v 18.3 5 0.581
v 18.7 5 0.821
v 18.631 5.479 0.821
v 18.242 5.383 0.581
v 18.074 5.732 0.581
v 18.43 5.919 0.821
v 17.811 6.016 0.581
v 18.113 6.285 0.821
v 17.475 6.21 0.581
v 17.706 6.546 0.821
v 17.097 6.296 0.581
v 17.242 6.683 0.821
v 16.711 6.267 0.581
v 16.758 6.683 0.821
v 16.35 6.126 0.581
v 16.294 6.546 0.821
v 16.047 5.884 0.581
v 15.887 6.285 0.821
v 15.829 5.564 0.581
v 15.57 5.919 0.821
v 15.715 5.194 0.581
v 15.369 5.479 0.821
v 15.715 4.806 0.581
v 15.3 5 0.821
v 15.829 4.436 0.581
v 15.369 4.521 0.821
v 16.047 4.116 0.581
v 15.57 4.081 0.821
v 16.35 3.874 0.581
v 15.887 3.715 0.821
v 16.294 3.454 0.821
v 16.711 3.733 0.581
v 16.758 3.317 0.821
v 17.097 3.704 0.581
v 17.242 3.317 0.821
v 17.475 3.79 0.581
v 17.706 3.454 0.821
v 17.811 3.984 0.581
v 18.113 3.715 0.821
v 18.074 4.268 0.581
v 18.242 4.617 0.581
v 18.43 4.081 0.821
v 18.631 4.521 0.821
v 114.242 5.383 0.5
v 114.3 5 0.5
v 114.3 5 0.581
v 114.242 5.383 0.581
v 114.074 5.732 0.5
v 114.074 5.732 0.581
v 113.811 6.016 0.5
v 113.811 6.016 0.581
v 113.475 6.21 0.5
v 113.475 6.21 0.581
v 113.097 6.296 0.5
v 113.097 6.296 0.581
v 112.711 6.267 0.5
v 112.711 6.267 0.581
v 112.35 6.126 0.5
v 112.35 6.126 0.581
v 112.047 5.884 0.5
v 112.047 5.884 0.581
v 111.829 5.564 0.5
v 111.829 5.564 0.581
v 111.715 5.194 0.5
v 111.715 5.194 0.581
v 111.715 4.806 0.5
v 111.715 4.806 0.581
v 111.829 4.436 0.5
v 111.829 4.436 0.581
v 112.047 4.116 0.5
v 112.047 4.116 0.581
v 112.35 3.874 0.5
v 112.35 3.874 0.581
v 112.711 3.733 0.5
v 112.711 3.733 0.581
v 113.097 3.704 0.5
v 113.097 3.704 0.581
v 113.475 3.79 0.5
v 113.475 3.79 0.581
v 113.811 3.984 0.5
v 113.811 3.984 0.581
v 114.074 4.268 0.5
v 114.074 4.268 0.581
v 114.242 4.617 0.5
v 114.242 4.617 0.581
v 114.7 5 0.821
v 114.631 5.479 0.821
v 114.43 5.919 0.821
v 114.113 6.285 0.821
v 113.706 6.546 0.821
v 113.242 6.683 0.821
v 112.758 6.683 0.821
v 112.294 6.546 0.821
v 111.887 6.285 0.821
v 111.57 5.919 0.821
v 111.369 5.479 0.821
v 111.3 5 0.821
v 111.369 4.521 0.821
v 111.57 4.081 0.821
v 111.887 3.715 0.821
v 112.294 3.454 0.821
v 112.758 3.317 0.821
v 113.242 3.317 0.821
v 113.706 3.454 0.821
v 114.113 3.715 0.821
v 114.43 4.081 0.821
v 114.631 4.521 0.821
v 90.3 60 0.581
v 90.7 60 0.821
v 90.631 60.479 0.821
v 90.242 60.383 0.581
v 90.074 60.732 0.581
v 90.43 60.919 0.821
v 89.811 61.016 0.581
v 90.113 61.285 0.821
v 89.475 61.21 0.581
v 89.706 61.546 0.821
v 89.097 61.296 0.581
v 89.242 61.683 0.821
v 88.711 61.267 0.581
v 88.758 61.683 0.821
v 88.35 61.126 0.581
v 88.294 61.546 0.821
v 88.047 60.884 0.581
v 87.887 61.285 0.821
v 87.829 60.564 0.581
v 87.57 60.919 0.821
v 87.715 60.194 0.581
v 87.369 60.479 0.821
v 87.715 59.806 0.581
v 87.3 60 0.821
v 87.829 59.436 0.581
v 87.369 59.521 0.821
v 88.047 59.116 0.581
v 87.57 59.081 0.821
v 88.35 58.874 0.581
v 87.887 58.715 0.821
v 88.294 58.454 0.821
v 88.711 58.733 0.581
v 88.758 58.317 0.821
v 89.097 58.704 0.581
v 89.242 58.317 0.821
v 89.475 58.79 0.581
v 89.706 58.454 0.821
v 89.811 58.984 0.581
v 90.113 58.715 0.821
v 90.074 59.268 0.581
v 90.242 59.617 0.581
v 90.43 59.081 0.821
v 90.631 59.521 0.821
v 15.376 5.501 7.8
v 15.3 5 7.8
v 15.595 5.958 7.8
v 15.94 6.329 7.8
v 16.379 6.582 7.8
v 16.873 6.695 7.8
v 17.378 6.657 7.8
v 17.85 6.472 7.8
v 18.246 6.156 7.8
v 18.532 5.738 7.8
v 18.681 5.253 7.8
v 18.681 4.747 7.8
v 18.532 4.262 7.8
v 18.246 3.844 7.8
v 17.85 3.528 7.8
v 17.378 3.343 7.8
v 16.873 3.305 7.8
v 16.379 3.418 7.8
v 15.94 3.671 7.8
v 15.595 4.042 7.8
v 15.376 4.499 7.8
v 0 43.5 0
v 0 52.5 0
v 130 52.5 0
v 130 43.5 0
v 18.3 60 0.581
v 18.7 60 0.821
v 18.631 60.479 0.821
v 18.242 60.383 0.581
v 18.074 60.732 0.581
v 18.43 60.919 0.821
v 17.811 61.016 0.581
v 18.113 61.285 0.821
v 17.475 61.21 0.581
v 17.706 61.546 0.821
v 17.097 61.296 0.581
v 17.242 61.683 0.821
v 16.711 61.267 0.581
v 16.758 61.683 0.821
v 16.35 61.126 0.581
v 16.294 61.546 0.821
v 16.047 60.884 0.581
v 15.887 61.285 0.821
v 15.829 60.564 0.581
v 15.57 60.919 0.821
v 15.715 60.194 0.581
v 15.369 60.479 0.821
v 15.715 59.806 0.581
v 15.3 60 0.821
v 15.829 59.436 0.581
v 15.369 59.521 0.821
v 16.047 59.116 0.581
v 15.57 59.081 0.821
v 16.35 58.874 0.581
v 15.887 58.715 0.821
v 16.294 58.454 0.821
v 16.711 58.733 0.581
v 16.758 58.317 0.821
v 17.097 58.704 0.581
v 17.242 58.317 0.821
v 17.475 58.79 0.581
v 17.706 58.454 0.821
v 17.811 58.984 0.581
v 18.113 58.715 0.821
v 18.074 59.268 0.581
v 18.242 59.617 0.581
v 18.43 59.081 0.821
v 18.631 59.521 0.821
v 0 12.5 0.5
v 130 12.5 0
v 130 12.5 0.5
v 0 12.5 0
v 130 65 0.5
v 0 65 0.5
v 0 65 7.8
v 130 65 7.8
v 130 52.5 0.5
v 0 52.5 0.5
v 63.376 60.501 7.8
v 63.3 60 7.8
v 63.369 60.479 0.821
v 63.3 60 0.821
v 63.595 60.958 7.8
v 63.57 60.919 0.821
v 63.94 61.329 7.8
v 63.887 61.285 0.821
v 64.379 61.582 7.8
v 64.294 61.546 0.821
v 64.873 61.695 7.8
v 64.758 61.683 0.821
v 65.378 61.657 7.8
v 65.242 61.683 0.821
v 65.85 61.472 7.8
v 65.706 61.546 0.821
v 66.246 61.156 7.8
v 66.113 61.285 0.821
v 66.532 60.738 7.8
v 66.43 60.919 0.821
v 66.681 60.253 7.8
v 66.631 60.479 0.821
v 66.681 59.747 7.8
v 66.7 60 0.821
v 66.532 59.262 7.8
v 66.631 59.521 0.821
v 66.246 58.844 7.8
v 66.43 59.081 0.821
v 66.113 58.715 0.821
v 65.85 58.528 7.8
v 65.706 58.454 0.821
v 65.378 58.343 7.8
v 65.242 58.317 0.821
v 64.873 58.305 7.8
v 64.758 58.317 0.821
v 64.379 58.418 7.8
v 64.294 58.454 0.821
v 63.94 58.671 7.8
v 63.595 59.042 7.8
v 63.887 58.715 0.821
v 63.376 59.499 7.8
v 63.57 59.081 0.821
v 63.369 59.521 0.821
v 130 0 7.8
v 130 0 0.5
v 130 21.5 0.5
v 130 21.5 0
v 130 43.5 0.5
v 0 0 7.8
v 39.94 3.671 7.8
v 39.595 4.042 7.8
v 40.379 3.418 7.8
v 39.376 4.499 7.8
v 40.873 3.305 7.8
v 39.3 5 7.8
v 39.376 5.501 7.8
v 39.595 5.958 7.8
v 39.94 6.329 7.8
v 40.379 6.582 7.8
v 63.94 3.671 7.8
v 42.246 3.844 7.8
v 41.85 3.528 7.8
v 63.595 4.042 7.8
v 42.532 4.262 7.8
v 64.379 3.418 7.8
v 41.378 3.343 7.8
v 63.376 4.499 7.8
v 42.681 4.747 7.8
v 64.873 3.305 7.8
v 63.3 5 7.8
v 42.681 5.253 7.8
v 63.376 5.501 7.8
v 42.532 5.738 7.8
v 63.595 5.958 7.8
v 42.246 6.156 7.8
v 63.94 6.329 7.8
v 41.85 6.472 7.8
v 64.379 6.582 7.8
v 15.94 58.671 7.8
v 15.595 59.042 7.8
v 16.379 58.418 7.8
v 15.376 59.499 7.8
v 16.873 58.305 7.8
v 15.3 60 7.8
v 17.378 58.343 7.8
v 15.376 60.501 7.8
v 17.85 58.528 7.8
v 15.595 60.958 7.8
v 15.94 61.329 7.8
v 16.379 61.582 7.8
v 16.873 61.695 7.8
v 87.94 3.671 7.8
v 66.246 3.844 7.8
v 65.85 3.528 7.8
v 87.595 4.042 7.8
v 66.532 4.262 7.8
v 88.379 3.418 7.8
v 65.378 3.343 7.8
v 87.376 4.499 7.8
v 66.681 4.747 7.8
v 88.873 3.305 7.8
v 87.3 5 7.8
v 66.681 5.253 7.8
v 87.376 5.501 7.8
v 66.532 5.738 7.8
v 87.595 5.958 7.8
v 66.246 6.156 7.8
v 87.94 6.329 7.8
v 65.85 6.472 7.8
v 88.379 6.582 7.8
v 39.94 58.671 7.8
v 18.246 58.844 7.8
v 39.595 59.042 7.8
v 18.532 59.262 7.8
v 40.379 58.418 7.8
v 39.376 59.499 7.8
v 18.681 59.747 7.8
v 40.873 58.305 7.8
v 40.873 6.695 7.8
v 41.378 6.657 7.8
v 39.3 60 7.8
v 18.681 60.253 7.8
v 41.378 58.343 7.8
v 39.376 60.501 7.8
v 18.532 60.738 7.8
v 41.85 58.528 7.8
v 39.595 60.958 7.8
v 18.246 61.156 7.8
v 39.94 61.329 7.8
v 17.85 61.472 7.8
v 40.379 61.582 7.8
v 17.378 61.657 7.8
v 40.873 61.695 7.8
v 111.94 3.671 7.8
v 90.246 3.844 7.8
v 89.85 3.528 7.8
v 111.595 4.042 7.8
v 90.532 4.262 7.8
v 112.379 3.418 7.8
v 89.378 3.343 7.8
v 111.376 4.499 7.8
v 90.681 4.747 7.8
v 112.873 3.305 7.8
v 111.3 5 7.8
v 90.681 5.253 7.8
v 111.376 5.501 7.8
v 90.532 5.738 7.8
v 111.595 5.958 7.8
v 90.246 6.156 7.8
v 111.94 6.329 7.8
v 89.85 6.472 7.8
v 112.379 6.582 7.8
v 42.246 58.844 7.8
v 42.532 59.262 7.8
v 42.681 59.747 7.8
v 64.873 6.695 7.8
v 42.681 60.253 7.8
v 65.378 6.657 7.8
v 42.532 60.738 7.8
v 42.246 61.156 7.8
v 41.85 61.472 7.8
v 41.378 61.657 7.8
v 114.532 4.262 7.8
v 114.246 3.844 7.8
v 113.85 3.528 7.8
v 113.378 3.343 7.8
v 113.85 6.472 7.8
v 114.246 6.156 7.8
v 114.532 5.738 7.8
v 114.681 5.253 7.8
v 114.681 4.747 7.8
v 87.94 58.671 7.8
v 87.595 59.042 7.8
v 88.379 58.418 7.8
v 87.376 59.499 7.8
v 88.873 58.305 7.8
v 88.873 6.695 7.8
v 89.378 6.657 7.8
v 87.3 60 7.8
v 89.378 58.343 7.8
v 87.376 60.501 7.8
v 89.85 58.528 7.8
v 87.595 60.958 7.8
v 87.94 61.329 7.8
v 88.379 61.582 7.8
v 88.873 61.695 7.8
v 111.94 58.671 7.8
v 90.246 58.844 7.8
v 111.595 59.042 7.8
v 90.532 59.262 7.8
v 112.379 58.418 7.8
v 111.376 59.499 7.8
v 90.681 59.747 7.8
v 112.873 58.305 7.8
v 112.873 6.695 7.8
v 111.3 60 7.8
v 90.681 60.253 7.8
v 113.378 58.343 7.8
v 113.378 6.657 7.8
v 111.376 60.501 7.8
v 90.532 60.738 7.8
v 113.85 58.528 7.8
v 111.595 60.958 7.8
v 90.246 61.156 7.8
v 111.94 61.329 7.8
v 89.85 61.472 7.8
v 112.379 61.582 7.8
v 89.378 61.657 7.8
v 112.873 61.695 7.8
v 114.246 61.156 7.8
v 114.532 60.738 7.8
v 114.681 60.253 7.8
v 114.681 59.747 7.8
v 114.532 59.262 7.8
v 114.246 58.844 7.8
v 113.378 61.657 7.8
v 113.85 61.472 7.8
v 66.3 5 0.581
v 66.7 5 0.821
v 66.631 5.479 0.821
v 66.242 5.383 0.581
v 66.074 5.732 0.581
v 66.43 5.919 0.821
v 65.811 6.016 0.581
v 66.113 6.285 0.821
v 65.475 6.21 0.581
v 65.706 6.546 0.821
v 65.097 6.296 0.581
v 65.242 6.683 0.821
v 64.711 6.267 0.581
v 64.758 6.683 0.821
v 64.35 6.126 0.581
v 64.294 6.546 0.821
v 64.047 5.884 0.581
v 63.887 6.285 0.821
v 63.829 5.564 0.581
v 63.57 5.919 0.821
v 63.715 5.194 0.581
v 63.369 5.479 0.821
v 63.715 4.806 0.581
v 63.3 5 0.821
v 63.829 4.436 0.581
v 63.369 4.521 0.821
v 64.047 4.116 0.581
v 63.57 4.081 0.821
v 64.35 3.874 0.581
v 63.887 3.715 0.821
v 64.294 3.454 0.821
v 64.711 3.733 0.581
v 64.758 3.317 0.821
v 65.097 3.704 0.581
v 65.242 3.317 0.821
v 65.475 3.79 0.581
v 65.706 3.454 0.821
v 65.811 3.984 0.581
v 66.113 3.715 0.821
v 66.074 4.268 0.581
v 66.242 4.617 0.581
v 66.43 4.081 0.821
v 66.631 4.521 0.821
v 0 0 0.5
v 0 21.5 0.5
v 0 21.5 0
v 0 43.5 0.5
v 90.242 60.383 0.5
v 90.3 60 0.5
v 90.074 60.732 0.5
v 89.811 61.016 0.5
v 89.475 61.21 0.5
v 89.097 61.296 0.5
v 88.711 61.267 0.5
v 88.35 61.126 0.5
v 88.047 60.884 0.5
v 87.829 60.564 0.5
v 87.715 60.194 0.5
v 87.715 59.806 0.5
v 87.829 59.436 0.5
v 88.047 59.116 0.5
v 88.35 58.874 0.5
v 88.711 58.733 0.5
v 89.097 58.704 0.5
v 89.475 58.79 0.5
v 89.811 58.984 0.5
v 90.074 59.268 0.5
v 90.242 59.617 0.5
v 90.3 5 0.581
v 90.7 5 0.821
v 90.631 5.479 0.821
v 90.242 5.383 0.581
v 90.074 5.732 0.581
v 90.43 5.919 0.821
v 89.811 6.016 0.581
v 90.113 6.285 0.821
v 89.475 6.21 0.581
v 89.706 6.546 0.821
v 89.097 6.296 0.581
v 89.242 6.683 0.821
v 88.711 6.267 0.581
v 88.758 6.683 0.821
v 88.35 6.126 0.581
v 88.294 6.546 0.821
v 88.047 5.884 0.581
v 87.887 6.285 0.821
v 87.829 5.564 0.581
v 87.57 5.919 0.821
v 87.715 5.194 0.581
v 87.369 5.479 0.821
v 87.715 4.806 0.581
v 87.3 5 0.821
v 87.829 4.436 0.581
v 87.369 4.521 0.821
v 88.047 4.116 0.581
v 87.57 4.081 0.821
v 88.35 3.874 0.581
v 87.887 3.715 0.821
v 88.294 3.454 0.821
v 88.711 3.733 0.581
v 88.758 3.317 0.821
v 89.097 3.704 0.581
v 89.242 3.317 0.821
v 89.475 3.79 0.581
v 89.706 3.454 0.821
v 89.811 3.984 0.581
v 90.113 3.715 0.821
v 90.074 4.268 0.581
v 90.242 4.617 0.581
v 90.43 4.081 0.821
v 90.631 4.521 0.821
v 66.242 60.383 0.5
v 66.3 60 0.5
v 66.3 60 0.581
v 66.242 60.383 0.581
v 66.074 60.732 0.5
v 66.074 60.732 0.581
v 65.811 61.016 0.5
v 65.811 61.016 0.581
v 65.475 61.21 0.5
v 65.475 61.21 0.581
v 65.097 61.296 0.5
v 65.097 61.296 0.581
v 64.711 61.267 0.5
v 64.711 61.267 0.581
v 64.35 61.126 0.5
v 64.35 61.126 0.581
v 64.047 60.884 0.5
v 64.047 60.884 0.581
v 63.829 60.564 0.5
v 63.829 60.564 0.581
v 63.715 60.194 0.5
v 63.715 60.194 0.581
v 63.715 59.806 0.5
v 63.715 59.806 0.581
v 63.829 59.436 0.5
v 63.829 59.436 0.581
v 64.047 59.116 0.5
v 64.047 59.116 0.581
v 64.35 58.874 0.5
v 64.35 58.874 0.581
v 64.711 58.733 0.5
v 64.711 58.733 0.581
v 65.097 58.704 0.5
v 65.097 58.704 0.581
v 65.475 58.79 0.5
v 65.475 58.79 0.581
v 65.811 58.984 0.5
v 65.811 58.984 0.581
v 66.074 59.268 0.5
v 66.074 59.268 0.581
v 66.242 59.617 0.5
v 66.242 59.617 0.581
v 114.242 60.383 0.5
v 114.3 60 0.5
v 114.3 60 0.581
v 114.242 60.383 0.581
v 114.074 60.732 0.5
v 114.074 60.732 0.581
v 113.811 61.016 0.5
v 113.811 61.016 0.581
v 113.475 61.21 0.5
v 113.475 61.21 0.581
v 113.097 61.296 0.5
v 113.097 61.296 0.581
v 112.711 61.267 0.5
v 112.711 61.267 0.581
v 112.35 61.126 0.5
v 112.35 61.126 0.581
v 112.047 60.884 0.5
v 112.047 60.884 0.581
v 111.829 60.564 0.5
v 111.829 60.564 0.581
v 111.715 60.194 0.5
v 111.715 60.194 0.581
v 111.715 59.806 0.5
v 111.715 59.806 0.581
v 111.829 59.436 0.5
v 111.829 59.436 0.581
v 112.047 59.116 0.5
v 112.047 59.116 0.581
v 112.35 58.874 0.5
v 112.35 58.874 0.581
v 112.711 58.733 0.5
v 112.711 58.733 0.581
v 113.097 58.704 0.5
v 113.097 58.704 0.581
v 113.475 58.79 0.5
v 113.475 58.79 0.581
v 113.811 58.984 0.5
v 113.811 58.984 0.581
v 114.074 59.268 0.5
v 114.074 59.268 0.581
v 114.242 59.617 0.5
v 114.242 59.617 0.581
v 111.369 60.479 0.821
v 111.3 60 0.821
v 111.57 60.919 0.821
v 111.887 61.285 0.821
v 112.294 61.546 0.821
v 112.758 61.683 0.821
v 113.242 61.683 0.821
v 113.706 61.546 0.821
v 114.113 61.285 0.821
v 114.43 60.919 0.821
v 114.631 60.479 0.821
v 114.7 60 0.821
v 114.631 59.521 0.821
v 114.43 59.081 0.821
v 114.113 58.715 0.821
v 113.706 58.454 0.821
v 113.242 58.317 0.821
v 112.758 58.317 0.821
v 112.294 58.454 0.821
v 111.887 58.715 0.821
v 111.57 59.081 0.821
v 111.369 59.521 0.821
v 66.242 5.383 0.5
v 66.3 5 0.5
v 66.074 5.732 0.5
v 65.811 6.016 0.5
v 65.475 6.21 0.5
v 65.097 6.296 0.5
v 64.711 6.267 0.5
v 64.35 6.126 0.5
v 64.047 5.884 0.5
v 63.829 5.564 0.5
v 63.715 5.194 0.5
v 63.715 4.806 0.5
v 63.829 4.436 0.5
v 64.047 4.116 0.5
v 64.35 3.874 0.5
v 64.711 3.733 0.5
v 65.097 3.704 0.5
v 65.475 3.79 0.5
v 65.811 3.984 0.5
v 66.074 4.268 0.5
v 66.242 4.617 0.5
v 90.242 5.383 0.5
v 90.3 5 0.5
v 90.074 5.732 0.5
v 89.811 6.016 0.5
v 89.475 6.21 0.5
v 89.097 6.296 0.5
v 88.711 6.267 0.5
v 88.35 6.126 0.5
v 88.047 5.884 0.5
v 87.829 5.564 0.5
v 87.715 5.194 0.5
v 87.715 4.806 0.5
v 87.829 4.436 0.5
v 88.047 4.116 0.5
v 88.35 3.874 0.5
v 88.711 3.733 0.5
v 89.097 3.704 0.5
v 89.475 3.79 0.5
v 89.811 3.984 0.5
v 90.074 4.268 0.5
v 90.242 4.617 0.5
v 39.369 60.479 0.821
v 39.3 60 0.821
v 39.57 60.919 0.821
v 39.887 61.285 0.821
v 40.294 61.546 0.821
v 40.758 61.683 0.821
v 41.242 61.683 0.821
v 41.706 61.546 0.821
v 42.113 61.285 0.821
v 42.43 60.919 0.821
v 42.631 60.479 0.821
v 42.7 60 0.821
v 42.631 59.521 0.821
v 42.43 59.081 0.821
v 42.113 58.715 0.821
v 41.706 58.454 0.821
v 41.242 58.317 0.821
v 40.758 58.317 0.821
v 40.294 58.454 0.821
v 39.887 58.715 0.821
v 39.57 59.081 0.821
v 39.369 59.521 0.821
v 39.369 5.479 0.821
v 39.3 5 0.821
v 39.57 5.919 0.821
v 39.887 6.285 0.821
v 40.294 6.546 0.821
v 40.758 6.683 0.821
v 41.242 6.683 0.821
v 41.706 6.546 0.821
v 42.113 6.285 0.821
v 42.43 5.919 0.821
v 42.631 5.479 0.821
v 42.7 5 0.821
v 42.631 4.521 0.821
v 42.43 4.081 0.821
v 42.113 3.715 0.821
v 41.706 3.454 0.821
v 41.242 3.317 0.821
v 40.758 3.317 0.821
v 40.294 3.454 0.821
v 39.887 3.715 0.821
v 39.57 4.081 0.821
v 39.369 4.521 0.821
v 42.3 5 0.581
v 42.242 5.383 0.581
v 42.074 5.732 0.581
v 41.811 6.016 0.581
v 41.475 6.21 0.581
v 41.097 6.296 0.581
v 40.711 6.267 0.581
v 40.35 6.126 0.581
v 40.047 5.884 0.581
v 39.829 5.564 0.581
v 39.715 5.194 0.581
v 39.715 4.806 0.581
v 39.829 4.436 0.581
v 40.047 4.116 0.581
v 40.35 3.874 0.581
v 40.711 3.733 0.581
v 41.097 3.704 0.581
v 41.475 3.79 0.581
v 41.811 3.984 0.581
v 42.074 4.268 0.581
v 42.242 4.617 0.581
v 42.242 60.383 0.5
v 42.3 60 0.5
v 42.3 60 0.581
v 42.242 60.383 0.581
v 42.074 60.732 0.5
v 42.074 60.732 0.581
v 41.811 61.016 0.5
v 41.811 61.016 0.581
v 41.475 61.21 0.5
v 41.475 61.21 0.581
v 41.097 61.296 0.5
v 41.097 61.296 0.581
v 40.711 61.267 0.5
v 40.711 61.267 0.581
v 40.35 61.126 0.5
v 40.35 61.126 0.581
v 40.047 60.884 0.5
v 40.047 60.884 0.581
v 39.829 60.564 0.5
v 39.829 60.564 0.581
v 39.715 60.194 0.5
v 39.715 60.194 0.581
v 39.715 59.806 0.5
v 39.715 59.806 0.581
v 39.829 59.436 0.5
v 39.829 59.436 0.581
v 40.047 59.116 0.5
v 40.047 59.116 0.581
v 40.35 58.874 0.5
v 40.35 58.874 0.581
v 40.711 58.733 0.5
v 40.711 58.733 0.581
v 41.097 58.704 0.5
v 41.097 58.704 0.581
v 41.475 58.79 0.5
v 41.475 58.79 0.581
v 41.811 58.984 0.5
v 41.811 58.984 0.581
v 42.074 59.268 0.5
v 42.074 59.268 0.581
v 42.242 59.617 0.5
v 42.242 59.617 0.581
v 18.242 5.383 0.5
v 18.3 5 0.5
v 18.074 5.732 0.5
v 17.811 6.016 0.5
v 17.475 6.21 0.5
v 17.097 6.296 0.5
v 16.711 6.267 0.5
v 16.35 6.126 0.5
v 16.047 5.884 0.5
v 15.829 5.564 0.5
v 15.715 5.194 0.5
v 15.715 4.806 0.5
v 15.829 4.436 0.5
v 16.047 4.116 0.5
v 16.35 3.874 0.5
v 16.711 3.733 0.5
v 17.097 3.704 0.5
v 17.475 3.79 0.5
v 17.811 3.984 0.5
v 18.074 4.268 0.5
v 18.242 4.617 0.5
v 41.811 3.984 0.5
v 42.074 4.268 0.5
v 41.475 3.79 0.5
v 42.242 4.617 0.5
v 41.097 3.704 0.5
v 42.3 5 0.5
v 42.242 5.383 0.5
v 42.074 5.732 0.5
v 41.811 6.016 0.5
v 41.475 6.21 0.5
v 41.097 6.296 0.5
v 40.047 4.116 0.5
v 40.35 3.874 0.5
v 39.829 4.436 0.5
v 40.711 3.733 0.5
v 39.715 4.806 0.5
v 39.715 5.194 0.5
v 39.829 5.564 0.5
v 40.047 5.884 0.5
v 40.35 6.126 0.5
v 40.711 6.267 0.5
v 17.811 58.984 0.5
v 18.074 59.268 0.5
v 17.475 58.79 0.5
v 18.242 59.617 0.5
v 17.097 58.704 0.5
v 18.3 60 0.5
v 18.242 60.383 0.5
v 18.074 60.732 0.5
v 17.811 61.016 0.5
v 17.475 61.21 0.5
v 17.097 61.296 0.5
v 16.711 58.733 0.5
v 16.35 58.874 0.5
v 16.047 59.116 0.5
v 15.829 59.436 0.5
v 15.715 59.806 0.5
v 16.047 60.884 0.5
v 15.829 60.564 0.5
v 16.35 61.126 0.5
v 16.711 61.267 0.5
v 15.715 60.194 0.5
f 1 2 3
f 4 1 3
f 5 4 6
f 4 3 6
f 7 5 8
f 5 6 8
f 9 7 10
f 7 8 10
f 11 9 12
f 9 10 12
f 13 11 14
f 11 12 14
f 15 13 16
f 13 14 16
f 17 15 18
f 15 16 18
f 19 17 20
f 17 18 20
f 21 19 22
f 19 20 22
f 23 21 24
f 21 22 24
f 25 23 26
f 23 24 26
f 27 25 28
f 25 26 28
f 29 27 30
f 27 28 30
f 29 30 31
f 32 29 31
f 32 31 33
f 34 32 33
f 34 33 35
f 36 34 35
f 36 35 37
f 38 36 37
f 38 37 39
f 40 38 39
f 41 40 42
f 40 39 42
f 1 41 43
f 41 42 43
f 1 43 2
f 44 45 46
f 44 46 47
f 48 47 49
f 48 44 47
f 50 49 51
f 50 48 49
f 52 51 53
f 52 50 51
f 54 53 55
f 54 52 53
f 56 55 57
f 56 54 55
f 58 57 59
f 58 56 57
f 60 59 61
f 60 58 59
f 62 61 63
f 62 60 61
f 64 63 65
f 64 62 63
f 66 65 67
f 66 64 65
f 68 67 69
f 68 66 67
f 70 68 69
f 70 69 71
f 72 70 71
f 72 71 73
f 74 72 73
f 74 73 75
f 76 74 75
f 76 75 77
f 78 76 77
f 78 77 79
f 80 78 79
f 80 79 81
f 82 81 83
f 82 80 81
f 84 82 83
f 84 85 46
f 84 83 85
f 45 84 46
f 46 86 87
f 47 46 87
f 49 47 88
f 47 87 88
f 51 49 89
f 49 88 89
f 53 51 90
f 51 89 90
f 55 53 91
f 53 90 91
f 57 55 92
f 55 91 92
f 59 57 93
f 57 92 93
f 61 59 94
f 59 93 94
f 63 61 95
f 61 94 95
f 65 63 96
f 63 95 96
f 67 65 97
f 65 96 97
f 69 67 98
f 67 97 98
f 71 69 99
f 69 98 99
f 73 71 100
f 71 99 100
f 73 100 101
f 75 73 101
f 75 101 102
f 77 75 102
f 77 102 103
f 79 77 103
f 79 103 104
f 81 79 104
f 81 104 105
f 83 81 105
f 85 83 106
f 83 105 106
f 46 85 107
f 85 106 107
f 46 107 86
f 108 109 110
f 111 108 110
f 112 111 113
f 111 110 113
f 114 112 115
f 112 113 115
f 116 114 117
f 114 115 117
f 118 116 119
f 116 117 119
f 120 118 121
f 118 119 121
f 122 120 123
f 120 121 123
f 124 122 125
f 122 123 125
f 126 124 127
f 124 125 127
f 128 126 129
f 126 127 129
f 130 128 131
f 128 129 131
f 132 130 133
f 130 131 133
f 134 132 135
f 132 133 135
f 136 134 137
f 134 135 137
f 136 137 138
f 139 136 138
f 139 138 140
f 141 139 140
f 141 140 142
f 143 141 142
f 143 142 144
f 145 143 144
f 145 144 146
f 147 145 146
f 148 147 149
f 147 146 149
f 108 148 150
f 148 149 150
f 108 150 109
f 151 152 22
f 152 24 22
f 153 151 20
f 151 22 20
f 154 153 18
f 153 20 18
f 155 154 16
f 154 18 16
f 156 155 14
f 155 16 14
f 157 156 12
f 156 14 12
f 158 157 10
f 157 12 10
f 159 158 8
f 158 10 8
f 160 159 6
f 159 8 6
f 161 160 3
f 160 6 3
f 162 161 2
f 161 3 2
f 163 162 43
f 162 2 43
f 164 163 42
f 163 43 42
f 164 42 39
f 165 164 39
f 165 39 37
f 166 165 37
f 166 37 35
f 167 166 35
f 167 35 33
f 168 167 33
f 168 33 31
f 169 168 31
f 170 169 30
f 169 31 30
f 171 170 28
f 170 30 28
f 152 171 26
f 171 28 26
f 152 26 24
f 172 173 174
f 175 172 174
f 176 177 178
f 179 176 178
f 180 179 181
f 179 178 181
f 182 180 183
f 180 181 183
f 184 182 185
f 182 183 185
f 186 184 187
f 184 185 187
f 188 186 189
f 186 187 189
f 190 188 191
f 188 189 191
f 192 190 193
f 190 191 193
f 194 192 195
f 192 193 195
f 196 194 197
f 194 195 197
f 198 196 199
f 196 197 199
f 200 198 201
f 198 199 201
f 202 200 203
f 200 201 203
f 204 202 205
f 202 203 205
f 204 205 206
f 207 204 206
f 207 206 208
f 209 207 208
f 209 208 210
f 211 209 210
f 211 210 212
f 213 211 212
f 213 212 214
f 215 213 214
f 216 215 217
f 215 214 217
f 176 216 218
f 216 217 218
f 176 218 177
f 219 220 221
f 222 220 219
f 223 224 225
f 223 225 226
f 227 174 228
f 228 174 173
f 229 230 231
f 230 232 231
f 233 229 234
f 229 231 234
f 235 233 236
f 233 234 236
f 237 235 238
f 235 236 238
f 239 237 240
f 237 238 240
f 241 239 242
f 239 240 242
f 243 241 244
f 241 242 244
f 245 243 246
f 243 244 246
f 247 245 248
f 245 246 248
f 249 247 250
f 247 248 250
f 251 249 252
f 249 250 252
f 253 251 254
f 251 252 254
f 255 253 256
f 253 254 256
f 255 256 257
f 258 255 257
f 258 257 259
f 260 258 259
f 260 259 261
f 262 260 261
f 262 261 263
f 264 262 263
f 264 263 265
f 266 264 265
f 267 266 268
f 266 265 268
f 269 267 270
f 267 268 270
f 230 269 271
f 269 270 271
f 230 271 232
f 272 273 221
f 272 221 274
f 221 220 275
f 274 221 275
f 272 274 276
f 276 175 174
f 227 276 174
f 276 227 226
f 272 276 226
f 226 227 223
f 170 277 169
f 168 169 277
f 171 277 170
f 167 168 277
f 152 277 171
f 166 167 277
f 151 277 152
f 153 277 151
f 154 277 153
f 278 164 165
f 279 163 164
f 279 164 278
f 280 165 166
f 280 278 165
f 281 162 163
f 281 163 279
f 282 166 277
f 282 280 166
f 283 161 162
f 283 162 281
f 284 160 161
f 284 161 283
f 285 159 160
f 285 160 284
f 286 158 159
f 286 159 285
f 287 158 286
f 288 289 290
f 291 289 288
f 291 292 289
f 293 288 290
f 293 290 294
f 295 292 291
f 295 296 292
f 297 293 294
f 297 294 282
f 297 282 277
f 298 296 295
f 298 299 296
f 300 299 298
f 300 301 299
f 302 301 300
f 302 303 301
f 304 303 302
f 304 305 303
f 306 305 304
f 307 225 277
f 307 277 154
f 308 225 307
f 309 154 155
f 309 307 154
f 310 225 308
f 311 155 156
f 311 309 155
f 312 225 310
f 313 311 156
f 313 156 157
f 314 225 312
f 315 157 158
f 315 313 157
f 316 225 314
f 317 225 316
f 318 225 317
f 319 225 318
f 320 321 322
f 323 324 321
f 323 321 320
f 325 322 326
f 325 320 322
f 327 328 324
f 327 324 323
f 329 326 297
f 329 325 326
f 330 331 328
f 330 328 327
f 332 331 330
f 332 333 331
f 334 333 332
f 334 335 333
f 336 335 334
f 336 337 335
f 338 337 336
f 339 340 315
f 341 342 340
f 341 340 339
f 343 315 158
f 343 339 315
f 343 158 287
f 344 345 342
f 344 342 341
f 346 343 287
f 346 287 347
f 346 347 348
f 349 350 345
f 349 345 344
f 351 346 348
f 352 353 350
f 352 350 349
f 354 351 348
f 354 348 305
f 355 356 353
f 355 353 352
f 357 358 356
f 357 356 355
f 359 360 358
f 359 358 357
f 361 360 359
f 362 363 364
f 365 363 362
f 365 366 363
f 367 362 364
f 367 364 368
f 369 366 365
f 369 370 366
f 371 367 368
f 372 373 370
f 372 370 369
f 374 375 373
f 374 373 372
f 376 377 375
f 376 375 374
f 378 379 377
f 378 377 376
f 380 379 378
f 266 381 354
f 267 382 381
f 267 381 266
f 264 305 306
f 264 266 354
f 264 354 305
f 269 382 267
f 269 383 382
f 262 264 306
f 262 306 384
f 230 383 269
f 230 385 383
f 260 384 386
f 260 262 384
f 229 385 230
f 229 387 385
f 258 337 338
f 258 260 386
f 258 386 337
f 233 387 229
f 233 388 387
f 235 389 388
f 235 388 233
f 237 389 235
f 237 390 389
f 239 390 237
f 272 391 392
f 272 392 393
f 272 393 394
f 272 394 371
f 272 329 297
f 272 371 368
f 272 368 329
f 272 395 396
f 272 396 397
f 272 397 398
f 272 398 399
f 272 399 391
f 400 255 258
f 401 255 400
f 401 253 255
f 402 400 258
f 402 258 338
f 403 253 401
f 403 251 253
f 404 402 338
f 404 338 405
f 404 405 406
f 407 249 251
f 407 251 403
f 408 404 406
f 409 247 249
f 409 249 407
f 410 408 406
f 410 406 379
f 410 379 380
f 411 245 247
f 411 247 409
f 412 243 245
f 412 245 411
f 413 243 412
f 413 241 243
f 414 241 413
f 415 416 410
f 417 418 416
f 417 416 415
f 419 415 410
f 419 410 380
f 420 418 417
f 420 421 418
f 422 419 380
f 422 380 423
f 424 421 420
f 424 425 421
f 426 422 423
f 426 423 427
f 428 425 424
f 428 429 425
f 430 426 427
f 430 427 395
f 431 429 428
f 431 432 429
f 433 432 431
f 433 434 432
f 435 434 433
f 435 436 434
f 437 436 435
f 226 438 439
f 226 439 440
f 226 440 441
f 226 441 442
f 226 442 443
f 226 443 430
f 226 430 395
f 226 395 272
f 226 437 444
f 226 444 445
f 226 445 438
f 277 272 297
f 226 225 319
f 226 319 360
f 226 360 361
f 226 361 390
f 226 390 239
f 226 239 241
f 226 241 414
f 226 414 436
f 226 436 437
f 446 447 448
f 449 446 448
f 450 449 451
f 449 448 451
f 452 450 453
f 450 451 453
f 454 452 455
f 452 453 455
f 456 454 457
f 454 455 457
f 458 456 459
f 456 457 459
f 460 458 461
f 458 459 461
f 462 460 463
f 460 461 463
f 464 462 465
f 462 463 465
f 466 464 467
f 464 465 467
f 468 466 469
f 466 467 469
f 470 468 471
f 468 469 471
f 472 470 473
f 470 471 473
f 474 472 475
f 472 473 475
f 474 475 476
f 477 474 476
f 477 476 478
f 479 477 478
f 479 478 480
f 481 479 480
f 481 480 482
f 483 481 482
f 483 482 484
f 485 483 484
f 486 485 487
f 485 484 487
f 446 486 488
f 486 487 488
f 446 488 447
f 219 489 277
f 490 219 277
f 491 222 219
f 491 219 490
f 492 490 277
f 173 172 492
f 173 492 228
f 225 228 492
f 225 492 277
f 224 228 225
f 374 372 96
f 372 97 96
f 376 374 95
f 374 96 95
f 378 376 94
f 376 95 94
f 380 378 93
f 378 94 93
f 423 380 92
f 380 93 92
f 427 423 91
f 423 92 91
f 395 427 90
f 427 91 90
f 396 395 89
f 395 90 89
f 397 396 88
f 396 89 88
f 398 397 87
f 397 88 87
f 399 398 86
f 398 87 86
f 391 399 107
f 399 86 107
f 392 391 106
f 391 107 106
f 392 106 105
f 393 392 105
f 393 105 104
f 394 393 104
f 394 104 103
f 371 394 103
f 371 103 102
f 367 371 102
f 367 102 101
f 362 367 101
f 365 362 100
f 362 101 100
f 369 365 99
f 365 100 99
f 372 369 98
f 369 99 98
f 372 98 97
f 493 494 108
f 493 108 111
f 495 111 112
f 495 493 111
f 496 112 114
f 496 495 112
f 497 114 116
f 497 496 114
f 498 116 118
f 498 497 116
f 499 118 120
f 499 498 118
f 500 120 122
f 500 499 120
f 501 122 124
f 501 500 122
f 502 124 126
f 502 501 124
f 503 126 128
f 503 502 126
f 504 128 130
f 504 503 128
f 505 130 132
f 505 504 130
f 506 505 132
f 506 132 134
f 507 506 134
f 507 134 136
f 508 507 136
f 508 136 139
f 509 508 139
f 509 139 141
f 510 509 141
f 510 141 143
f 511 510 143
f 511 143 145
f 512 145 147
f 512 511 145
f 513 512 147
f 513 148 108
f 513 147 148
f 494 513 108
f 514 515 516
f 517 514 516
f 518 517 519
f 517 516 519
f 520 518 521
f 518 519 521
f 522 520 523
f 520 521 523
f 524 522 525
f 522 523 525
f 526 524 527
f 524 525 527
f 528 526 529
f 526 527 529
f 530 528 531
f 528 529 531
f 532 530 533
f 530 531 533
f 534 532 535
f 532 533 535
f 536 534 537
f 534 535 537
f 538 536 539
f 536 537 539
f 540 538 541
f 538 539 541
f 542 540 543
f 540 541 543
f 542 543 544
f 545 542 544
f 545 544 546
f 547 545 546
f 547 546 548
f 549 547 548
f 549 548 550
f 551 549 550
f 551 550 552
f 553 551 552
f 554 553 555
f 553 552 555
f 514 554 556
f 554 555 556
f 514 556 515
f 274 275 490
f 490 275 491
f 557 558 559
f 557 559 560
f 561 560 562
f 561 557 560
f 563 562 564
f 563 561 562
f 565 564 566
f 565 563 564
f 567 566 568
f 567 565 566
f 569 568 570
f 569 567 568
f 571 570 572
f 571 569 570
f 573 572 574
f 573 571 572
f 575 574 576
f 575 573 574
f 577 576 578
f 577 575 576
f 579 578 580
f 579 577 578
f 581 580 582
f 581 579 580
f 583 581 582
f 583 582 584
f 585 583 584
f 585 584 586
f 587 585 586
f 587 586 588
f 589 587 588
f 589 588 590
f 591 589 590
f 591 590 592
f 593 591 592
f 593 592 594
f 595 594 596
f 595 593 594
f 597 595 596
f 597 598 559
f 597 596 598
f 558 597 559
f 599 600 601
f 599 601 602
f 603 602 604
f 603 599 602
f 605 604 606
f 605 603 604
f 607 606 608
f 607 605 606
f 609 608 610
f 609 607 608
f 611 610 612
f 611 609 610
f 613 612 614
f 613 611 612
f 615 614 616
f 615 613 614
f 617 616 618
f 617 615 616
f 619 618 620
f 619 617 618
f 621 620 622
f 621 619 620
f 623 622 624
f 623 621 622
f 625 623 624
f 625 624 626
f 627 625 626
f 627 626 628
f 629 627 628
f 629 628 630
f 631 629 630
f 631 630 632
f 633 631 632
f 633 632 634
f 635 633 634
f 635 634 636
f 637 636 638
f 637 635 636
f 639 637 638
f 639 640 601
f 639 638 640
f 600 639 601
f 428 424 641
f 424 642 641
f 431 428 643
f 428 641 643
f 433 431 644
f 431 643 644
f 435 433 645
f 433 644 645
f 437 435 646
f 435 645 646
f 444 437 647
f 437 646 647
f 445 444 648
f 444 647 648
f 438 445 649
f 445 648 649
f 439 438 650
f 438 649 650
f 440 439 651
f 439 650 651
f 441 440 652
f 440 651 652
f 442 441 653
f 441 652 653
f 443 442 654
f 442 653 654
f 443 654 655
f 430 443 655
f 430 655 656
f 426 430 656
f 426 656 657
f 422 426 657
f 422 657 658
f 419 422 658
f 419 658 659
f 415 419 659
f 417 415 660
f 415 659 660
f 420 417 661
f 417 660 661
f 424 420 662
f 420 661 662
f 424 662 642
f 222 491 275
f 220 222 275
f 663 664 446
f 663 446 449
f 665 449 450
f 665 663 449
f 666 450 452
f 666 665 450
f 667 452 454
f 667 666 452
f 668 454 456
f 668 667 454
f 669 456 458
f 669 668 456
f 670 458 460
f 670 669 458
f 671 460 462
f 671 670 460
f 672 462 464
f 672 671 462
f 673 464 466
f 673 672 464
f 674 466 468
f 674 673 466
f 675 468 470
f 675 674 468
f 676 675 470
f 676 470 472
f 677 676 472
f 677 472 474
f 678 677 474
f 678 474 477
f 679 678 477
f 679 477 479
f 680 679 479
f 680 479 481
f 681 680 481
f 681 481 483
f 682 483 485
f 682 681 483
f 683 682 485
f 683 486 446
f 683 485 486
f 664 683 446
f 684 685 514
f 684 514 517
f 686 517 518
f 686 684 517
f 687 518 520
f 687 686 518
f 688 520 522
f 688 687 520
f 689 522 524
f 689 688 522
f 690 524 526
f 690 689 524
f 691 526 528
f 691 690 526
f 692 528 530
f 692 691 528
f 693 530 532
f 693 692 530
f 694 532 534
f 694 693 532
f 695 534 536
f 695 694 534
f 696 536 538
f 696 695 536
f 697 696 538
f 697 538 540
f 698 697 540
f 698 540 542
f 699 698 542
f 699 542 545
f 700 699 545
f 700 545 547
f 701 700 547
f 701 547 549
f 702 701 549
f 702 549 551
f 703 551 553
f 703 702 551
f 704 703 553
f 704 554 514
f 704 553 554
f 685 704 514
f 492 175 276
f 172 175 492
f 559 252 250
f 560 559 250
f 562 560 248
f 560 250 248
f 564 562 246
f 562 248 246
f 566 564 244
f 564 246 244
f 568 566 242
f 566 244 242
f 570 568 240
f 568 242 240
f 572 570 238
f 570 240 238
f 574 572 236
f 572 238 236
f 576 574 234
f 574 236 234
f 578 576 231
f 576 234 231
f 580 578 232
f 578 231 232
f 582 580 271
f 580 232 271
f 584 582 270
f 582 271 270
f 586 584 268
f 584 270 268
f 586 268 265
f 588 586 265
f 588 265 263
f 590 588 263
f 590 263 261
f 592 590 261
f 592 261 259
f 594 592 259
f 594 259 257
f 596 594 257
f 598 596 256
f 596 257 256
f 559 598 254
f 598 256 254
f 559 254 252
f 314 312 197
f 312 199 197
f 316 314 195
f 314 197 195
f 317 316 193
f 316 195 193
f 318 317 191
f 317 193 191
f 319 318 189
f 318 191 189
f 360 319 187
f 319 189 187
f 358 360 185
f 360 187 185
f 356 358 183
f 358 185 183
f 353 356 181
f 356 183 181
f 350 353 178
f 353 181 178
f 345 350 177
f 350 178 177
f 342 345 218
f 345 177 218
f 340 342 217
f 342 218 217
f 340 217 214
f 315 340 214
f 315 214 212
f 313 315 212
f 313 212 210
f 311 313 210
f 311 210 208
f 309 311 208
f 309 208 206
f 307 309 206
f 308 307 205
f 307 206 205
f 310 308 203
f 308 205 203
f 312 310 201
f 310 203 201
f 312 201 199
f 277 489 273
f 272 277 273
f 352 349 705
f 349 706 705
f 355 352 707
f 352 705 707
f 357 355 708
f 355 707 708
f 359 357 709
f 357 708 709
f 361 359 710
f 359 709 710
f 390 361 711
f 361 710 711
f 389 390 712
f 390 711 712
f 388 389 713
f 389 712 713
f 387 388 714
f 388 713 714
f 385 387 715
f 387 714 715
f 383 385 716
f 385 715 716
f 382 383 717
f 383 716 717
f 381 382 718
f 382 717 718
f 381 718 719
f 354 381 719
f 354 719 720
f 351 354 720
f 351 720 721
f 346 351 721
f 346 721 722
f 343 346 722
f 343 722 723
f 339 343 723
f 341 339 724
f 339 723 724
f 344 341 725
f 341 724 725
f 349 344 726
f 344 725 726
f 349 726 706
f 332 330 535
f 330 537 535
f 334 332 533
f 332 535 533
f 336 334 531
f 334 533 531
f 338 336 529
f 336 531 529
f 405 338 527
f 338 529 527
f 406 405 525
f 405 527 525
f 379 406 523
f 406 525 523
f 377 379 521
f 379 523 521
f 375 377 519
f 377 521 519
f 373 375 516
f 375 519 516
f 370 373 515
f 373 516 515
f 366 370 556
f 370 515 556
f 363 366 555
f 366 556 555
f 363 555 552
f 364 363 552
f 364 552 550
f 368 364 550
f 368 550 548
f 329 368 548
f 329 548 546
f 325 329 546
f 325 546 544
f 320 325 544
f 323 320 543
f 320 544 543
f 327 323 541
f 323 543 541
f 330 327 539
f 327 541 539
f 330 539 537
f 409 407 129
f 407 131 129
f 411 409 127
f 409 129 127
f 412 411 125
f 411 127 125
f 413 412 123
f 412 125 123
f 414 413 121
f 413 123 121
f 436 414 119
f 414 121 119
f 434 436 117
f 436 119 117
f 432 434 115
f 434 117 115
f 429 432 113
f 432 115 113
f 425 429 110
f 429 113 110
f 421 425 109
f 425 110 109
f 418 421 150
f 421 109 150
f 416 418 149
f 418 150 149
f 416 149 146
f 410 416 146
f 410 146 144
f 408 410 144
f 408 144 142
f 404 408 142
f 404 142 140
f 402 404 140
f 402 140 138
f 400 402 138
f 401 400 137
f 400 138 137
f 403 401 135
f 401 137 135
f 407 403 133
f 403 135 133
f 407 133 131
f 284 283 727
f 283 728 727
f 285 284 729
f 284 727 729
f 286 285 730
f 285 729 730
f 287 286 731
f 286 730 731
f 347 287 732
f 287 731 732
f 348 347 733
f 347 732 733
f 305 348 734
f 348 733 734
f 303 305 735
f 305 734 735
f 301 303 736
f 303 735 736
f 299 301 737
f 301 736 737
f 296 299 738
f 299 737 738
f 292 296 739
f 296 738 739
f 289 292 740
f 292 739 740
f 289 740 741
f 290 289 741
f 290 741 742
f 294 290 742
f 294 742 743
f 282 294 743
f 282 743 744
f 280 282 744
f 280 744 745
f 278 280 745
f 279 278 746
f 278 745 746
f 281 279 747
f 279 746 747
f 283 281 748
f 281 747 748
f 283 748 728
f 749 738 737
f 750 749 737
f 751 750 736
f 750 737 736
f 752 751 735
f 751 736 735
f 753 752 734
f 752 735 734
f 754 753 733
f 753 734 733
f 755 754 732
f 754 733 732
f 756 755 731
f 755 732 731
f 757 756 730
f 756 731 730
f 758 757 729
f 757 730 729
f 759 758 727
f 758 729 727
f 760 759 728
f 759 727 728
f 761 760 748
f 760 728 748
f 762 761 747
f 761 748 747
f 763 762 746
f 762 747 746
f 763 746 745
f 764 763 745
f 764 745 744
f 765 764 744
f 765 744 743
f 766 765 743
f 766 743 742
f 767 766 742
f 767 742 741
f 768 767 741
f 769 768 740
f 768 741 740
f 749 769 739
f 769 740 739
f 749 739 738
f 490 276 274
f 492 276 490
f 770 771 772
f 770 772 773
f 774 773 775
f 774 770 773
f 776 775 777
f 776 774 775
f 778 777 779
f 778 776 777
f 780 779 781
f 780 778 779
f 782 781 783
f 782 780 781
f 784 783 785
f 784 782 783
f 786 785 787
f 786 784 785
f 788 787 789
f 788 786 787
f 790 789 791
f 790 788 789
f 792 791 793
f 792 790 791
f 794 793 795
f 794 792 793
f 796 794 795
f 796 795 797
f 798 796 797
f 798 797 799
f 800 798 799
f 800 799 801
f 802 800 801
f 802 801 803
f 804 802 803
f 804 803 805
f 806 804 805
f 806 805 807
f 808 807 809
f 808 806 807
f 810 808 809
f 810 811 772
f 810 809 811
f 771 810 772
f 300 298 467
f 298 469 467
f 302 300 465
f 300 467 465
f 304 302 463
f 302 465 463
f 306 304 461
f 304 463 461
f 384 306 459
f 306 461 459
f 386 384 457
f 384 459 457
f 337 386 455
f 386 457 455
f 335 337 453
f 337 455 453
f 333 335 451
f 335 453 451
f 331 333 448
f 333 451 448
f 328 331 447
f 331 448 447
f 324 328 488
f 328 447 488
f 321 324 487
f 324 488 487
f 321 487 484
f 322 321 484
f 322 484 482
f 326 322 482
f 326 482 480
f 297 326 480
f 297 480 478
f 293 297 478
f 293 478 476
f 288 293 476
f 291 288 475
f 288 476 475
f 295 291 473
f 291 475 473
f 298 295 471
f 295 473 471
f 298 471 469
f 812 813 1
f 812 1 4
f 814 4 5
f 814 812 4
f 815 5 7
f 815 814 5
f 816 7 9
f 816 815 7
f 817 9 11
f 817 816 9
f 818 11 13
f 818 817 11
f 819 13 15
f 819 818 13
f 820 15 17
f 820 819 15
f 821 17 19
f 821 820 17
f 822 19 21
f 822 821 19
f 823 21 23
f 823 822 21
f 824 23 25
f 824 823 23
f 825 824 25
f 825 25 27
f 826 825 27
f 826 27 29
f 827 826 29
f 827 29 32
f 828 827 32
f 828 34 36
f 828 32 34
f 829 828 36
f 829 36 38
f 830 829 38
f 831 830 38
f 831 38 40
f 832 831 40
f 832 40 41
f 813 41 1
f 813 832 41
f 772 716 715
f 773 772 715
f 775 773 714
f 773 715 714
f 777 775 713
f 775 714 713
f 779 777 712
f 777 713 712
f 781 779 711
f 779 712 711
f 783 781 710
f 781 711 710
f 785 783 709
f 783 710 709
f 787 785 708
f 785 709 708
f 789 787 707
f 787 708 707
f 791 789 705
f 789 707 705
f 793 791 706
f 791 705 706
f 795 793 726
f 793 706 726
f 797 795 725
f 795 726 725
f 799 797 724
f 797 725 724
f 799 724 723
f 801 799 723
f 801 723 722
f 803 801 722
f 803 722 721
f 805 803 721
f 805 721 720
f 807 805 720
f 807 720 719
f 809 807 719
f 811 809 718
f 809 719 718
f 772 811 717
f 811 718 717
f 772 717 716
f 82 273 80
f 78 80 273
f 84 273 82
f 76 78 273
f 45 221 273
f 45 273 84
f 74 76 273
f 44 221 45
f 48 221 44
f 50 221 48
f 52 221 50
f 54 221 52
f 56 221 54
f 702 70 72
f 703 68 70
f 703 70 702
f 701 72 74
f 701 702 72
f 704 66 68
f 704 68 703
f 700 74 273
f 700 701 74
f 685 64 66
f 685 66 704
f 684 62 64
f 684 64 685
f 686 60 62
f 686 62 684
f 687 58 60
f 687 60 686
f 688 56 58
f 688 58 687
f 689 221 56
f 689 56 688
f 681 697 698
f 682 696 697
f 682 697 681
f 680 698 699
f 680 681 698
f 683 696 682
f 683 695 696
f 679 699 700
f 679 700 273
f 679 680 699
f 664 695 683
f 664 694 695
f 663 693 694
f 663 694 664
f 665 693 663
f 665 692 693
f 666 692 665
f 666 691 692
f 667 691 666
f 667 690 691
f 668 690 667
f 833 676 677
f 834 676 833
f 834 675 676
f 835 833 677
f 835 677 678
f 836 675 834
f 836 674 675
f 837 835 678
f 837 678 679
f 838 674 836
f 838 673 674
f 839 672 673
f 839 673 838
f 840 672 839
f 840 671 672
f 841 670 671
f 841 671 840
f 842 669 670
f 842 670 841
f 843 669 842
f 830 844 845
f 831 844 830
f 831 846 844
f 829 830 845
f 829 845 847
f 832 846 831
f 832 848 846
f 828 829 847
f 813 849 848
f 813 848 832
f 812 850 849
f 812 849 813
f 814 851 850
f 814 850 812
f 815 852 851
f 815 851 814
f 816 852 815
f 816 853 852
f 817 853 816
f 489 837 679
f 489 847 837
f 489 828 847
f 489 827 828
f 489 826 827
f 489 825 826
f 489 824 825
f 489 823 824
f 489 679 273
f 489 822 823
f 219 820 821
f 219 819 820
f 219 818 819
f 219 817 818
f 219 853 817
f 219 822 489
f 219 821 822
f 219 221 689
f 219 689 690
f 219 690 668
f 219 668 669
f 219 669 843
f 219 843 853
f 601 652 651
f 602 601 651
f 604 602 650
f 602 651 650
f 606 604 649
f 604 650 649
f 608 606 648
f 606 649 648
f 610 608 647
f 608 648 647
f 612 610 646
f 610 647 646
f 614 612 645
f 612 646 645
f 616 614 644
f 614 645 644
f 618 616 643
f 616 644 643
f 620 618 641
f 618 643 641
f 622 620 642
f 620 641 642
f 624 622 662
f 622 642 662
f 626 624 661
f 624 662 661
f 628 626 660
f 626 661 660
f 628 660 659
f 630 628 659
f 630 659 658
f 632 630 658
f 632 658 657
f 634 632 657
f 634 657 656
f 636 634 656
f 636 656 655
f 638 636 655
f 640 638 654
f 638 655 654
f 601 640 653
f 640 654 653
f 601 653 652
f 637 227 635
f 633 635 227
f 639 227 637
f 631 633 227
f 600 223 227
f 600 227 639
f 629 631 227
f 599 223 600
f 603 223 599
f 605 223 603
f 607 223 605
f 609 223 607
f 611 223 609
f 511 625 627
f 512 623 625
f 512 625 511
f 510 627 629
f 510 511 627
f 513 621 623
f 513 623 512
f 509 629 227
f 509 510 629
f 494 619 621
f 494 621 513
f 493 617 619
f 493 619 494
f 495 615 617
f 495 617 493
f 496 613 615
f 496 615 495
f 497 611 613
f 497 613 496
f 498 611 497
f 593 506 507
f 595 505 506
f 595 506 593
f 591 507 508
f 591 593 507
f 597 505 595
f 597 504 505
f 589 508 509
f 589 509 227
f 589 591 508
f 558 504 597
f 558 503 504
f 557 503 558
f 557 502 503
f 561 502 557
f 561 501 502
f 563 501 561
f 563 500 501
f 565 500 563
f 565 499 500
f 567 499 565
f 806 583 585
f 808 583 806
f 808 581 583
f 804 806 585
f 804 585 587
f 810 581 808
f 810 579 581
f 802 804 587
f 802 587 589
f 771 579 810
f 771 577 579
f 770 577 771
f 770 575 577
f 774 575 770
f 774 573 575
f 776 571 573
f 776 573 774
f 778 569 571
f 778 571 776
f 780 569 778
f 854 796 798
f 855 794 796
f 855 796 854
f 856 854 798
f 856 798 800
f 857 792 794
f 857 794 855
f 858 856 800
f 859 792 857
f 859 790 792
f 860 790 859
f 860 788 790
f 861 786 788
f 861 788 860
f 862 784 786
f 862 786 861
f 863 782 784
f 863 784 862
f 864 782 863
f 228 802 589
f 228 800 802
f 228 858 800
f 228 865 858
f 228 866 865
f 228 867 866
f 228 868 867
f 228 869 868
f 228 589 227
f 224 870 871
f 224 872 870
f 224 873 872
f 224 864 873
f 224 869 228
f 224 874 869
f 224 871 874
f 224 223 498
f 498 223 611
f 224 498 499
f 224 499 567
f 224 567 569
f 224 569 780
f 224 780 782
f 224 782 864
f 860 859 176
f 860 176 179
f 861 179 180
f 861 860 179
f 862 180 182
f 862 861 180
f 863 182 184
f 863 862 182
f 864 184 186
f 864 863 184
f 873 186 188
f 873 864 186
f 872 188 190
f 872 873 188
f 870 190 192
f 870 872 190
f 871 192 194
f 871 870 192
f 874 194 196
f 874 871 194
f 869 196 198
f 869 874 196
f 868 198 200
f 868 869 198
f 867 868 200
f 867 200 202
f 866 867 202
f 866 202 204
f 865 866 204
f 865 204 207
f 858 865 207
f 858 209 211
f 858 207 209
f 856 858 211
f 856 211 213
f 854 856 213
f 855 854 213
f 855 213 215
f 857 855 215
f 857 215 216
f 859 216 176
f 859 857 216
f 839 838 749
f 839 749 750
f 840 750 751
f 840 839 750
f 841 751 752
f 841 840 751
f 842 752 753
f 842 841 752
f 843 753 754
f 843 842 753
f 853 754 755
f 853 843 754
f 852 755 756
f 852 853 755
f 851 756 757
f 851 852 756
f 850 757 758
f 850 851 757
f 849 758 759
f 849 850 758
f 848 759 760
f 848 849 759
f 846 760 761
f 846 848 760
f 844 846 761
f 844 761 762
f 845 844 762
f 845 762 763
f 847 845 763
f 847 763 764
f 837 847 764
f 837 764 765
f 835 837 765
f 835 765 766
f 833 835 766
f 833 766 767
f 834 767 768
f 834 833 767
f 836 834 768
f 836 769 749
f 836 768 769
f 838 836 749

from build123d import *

# Parameters (mm, degrees)
ESQUISSE1_W             = 130
ESQUISSE1_H             = 65
ESQUISSE1_R             = 1.3
BOSS_EXTRU_1_DEPTH      = 7.8
ESQUISSE2_W             = 130
ESQUISSE2_H             = 12.5
ESQUISSE2_H_2           = 22
ENL_V_MAT_EXTRU_1_DEPTH = 0.5
D_GAGEMENT_M3_D         = 3.4
D_GAGEMENT_M3_DEPTH     = 6.978536948
D_GAGEMENT_M3_TIP       = 1.021463052


with BuildPart() as part:
    # Esquisse1 → Boss.-Extru.1 (new body)
    with BuildSketch(Plane.XY):
        with Locations((65, 32.5)):
            Rectangle(ESQUISSE1_W, ESQUISSE1_H)
        with Locations((113, 5)):
            Circle(ESQUISSE1_R, mode=Mode.SUBTRACT)
        with Locations((89, 5)):
            Circle(ESQUISSE1_R, mode=Mode.SUBTRACT)
        with Locations((65, 5)):
            Circle(ESQUISSE1_R, mode=Mode.SUBTRACT)
        with Locations((41, 5)):
            Circle(ESQUISSE1_R, mode=Mode.SUBTRACT)
        with Locations((17, 5)):
            Circle(ESQUISSE1_R, mode=Mode.SUBTRACT)
        with Locations((113, 60)):
            Circle(ESQUISSE1_R, mode=Mode.SUBTRACT)
        with Locations((89, 60)):
            Circle(ESQUISSE1_R, mode=Mode.SUBTRACT)
        with Locations((65, 60)):
            Circle(ESQUISSE1_R, mode=Mode.SUBTRACT)
        with Locations((41, 60)):
            Circle(ESQUISSE1_R, mode=Mode.SUBTRACT)
        with Locations((17, 60)):
            Circle(ESQUISSE1_R, mode=Mode.SUBTRACT)
    extrude(amount=BOSS_EXTRU_1_DEPTH)

    # Esquisse2 → Enlèv. mat.-Extru.1 (cut)
    with BuildSketch(Plane(origin=(0, 0, 0), x_dir=(-1, 0, 0), z_dir=(0, 0, -1))):
        with Locations((-65, 58.75)):
            Rectangle(ESQUISSE2_W, ESQUISSE2_H)
        with Locations((-65, 6.25)):
            Rectangle(ESQUISSE2_W, ESQUISSE2_H)
        with Locations((-65, 32.5)):
            Rectangle(ESQUISSE2_W, ESQUISSE2_H_2)
    extrude(amount=-ENL_V_MAT_EXTRU_1_DEPTH, mode=Mode.SUBTRACT)

    # Dégagement M3
    with Locations(Plane.XY.offset(7.8)):
        with Locations((17, 60), (41, 60), (65, 60), (89, 60), (113, 60), (113, 5), (89, 5), (65, 5), (41, 5), (17, 5)):
            Hole(D_GAGEMENT_M3_D / 2, depth=D_GAGEMENT_M3_DEPTH)
            with Locations((0, 0, -(D_GAGEMENT_M3_DEPTH + D_GAGEMENT_M3_TIP / 2))):  # 118° drill point
                Cone(0, D_GAGEMENT_M3_D / 2, D_GAGEMENT_M3_TIP, mode=Mode.SUBTRACT)


solid = part.part
